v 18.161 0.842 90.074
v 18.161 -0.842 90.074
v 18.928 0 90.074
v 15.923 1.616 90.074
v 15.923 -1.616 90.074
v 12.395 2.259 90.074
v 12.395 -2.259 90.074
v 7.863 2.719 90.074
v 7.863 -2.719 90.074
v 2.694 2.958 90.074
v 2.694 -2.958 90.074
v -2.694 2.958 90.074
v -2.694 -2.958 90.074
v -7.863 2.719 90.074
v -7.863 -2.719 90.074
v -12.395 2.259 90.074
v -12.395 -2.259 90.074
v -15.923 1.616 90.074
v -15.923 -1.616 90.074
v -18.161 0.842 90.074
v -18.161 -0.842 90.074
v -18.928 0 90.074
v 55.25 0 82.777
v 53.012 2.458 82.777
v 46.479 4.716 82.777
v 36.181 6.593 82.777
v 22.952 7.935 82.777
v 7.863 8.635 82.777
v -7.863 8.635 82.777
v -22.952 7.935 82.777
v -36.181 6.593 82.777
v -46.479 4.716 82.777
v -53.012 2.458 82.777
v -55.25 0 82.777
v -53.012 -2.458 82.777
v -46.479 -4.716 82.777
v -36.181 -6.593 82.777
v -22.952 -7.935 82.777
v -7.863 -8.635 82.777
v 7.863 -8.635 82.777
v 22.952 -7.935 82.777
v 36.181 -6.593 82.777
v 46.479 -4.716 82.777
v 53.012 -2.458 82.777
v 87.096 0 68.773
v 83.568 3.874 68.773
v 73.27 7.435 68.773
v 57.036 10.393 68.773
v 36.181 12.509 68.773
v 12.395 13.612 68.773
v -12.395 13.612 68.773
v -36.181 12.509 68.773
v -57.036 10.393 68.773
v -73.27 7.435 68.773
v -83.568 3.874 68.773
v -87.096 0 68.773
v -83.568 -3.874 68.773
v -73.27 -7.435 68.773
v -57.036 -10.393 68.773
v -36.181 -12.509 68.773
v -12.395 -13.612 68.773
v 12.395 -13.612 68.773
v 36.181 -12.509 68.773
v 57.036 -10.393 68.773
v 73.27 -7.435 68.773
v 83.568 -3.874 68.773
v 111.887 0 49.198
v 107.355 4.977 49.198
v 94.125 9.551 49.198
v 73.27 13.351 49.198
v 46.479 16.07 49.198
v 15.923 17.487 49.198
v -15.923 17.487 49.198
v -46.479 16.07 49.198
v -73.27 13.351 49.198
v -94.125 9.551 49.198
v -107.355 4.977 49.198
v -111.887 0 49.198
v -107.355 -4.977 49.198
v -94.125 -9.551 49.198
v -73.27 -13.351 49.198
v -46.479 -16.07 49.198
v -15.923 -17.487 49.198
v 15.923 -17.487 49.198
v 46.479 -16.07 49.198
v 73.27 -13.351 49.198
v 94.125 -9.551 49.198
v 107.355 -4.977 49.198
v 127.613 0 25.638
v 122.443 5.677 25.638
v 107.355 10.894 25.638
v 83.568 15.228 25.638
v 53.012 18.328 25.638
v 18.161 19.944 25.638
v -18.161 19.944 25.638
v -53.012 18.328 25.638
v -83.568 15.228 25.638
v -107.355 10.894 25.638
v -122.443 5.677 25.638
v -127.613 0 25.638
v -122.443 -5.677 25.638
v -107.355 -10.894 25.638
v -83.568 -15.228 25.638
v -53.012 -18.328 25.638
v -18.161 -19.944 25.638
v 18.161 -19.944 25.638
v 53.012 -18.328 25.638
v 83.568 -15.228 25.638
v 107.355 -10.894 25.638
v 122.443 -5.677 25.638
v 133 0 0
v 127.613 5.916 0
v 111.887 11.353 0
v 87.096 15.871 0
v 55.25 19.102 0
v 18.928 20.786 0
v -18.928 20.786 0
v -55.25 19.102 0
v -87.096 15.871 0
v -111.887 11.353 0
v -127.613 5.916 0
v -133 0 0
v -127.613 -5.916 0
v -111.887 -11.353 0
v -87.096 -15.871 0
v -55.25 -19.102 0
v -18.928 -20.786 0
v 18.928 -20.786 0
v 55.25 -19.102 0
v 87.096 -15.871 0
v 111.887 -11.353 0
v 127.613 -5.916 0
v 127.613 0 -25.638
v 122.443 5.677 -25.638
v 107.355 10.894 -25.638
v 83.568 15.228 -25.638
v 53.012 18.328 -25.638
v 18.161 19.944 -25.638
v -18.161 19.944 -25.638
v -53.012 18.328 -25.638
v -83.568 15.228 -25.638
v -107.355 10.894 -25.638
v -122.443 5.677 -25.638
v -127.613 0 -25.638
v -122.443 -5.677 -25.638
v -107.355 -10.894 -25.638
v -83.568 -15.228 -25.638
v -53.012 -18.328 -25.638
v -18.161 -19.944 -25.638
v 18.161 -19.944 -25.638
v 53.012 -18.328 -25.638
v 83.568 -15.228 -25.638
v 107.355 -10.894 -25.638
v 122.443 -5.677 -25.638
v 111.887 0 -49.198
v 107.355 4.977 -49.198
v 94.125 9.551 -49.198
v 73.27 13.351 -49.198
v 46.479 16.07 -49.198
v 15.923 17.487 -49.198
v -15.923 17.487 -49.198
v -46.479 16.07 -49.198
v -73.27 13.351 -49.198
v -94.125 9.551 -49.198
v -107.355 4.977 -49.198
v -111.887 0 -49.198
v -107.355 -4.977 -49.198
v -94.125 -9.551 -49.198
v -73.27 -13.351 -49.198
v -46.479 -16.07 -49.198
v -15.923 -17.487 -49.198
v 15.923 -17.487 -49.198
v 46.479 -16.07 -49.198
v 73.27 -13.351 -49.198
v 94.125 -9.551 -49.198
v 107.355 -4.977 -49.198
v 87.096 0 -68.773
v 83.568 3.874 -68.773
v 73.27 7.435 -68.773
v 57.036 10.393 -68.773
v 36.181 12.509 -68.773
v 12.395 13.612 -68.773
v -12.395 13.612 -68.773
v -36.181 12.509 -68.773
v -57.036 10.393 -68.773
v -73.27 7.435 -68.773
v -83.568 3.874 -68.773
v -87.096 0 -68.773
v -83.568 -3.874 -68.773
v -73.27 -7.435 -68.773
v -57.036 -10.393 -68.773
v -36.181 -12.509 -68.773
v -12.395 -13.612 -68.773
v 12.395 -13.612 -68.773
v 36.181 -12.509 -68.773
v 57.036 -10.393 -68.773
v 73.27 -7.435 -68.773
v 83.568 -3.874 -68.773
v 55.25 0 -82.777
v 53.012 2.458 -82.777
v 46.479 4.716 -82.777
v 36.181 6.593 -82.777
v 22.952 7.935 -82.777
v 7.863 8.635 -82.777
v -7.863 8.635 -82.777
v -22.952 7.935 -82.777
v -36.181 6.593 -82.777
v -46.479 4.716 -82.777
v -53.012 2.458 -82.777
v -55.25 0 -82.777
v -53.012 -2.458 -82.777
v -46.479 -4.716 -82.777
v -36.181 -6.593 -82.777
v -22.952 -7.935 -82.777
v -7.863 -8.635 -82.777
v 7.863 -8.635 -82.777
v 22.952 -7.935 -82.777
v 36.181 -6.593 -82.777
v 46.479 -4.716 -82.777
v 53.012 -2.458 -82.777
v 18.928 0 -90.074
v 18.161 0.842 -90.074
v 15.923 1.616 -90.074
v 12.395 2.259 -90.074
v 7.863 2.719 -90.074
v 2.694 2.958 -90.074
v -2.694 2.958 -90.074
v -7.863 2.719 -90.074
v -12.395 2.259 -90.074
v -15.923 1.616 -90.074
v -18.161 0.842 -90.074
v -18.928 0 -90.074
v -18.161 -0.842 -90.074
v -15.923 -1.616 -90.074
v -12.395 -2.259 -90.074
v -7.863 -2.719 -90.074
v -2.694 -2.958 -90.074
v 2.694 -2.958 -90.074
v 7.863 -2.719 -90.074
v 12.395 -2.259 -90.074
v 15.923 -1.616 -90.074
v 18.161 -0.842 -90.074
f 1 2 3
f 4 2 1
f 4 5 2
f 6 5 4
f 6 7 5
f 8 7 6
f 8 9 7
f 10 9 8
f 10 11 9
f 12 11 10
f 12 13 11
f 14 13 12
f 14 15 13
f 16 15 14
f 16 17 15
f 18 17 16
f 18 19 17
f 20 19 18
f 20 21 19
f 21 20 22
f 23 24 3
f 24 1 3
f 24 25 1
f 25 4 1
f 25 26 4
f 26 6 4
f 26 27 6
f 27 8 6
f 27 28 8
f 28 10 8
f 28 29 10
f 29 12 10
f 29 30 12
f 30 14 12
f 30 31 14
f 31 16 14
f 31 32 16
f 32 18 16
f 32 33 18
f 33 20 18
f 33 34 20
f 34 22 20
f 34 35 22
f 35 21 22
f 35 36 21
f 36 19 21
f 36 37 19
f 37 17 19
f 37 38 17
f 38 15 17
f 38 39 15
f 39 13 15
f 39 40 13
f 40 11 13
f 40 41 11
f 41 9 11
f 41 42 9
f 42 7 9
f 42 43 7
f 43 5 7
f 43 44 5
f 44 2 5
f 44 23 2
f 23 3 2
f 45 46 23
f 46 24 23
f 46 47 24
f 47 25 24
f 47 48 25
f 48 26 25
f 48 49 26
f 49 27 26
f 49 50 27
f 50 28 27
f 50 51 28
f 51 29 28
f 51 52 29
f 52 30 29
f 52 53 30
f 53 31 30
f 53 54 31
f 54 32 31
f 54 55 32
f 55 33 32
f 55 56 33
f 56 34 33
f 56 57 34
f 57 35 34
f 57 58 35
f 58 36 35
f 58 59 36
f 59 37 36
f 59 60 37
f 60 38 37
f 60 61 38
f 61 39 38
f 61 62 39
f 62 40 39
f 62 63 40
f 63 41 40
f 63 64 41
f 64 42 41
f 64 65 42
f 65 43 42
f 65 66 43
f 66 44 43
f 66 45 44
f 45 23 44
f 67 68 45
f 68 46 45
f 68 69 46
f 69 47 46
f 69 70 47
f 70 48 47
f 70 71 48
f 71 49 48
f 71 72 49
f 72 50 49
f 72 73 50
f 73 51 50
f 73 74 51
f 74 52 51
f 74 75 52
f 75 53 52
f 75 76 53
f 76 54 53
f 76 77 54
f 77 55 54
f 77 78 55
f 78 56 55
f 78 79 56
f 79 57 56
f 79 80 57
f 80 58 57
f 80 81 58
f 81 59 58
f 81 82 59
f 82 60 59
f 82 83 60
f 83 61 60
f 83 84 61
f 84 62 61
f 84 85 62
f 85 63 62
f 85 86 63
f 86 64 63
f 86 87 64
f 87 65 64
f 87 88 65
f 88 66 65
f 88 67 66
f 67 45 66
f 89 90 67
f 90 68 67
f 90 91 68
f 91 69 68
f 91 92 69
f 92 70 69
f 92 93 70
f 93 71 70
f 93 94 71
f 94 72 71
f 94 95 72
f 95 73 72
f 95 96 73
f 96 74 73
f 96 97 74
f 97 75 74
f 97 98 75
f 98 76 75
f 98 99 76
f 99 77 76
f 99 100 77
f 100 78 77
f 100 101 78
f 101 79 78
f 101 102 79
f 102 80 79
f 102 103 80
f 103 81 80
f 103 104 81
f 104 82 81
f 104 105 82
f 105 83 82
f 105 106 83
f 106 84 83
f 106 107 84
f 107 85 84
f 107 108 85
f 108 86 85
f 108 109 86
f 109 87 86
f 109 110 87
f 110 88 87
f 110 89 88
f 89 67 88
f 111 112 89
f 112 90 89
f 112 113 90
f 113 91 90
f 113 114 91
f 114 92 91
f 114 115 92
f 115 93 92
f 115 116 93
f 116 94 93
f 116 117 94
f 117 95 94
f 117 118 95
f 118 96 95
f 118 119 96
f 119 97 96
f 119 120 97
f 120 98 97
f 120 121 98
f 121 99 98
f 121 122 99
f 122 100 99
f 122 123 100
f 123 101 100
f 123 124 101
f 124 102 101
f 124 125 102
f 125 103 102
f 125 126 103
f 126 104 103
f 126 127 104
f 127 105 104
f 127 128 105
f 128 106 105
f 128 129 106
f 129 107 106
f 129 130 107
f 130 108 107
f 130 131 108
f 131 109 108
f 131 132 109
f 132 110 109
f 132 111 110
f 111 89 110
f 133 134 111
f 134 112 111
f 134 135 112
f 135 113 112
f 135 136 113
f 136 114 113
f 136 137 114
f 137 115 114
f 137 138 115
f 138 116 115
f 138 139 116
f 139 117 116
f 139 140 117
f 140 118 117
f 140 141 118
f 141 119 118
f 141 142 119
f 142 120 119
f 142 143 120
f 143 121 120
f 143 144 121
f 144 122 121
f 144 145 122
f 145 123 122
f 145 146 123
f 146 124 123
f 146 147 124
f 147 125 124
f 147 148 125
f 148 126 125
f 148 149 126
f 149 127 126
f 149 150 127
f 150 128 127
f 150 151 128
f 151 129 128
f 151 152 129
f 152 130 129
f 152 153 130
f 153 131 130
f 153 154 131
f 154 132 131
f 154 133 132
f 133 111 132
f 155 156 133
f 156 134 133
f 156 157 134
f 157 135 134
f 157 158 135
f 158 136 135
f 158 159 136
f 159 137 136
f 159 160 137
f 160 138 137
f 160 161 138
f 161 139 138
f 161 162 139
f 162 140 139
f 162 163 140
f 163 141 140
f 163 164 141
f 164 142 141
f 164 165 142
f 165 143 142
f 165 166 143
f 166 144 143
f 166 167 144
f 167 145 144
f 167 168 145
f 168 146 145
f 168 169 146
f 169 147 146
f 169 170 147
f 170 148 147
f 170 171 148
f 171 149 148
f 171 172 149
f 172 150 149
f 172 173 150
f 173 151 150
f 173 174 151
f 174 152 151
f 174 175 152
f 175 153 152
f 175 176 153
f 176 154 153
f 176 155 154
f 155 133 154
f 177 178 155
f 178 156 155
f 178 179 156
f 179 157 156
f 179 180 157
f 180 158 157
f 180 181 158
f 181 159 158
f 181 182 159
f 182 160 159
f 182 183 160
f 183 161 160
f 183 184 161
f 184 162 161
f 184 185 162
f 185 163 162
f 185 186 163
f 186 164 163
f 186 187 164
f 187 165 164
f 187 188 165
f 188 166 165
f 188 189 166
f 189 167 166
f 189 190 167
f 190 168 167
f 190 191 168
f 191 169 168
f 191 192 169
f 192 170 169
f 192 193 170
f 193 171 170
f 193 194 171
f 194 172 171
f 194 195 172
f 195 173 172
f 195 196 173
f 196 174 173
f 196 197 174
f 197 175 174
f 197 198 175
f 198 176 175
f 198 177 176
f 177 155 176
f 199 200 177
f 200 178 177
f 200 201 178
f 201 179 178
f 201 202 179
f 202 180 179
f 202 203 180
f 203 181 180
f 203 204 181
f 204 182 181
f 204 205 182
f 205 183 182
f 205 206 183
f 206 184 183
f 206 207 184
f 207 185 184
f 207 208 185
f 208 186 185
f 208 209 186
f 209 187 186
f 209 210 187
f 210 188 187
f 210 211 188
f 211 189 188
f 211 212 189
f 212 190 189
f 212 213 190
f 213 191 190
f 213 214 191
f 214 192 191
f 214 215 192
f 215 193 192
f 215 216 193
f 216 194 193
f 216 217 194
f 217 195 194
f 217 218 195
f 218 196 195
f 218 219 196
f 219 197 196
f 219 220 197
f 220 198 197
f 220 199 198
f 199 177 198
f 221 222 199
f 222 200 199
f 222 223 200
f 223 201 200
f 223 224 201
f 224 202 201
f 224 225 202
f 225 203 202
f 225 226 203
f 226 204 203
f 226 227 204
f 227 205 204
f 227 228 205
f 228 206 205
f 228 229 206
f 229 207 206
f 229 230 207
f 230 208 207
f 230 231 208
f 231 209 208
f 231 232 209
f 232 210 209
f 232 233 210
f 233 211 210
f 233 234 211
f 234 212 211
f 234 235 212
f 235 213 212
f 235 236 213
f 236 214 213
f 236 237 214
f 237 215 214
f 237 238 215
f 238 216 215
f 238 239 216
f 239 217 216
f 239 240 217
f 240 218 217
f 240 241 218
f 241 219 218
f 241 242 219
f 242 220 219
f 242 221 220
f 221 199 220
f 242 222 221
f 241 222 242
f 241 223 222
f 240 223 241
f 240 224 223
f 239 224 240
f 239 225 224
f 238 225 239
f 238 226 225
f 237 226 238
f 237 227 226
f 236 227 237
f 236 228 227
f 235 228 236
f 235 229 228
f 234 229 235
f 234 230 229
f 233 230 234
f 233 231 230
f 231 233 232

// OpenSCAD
// Generated by SolidPython 1.0.1 on 2020-07-29 00:46:53


scale(v = [19, 3, 13]) {
	sphere(r = 7);
}
/***********************************************
*********      SolidPython code:      **********
************************************************
 
# import packages: SolidPython
from solid import *
from solid.utils import *
from itertools import chain, combinations, permutations


class Resize:

    def __init__(self, scad_file):
        self.scad_file = scad_file
        #self.scad_file = import_scad(scad_file)
        # cone/cylinder param:
        self.r1 = 0
        self.r2 = 0
        self.h = 0
        # rectangular prism param:
        self.w = 0
        self.l = 0
        # ellipse param:
        self.r = 0

    # import OpenScad code (file name corresponds to shape)


    # classify shape + parameters
    def assign(self, param1, param2, param3):
        if self.scad_file == 'cone.scad':
            self.r1 = param1
            self.r2 = param2
            self.h = param3
        elif self.scad_file == 'cylinder.scad':
            self.r1 = param1
            self.r2 = param2
            self.h = param3
        elif self.scad_file == 'rectangularPrism.scad':
            self.h = param1
            self.l = param2
            self.w = param3
        else:
            self.r = param1
            self.h = param2

    # resize parameters
    def iterate(self):
        x = range(3, 20, 2)
        i = 1
        if self.scad_file == 'cone.scad':
            tempList = list(permutations(x, 2))
            for temp in tempList:
                param1 = temp[0]
                param2 = temp[1]
                filepath = 'produced_scad_files/' + 'cone' + str(param1) + '_' + str(param2) + '_' + '.scad'
                scad_render_to_file(cylinder(h=param1, r1=param2, r2=0), filepath)

        elif self.scad_file == 'cylinder.scad':
            tempList = list(permutations(x, 3))
            for temp in tempList:
                param1 = temp[0]
                param2 = temp[1]
                filepath = 'produced_scad_files/' + 'cylinder' + str(param1) + '_' + str(param2) + '_' + '.scad'
                scad_render_to_file(cylinder(h=param1, r1=param2, r2=param2), filepath)

        elif self.scad_file == 'rectangularPrism.scad':
            tempList = list(permutations(x, 3))
            for temp in tempList:
                param1 = temp[0]
                param2 = temp[1]
                param3 = temp[2]
                filepath = 'produced_scad_files/' + 'rectangularPrism' + str(param1) + '_' + str(param2) + '_' + str(
                    param3) + '.scad'
                scad_render_to_file(cube(size=(param1, param2, param3)), filepath)

        elif self.scad_file == 'ellipse.scad':
            tempList = list(permutations(x, 4))
            for temp in tempList:
                param1 = temp[0]
                param2 = temp[1]
                param3 = temp[2]
                param4 = temp[3]
                filepath = 'produced_scad_files/' + 'ellipse' + str(param1) + '_' + str(param2) + '_' + str(param3) + '_' + str(param4) + '.scad'
                scad_render_to_file(scale([param1, param2, param3])(sphere(r=param4)), filepath)

    def render_to_scadfile(self):
        scad_render_to_file(scad, 'example.scad') 
 
************************************************/
